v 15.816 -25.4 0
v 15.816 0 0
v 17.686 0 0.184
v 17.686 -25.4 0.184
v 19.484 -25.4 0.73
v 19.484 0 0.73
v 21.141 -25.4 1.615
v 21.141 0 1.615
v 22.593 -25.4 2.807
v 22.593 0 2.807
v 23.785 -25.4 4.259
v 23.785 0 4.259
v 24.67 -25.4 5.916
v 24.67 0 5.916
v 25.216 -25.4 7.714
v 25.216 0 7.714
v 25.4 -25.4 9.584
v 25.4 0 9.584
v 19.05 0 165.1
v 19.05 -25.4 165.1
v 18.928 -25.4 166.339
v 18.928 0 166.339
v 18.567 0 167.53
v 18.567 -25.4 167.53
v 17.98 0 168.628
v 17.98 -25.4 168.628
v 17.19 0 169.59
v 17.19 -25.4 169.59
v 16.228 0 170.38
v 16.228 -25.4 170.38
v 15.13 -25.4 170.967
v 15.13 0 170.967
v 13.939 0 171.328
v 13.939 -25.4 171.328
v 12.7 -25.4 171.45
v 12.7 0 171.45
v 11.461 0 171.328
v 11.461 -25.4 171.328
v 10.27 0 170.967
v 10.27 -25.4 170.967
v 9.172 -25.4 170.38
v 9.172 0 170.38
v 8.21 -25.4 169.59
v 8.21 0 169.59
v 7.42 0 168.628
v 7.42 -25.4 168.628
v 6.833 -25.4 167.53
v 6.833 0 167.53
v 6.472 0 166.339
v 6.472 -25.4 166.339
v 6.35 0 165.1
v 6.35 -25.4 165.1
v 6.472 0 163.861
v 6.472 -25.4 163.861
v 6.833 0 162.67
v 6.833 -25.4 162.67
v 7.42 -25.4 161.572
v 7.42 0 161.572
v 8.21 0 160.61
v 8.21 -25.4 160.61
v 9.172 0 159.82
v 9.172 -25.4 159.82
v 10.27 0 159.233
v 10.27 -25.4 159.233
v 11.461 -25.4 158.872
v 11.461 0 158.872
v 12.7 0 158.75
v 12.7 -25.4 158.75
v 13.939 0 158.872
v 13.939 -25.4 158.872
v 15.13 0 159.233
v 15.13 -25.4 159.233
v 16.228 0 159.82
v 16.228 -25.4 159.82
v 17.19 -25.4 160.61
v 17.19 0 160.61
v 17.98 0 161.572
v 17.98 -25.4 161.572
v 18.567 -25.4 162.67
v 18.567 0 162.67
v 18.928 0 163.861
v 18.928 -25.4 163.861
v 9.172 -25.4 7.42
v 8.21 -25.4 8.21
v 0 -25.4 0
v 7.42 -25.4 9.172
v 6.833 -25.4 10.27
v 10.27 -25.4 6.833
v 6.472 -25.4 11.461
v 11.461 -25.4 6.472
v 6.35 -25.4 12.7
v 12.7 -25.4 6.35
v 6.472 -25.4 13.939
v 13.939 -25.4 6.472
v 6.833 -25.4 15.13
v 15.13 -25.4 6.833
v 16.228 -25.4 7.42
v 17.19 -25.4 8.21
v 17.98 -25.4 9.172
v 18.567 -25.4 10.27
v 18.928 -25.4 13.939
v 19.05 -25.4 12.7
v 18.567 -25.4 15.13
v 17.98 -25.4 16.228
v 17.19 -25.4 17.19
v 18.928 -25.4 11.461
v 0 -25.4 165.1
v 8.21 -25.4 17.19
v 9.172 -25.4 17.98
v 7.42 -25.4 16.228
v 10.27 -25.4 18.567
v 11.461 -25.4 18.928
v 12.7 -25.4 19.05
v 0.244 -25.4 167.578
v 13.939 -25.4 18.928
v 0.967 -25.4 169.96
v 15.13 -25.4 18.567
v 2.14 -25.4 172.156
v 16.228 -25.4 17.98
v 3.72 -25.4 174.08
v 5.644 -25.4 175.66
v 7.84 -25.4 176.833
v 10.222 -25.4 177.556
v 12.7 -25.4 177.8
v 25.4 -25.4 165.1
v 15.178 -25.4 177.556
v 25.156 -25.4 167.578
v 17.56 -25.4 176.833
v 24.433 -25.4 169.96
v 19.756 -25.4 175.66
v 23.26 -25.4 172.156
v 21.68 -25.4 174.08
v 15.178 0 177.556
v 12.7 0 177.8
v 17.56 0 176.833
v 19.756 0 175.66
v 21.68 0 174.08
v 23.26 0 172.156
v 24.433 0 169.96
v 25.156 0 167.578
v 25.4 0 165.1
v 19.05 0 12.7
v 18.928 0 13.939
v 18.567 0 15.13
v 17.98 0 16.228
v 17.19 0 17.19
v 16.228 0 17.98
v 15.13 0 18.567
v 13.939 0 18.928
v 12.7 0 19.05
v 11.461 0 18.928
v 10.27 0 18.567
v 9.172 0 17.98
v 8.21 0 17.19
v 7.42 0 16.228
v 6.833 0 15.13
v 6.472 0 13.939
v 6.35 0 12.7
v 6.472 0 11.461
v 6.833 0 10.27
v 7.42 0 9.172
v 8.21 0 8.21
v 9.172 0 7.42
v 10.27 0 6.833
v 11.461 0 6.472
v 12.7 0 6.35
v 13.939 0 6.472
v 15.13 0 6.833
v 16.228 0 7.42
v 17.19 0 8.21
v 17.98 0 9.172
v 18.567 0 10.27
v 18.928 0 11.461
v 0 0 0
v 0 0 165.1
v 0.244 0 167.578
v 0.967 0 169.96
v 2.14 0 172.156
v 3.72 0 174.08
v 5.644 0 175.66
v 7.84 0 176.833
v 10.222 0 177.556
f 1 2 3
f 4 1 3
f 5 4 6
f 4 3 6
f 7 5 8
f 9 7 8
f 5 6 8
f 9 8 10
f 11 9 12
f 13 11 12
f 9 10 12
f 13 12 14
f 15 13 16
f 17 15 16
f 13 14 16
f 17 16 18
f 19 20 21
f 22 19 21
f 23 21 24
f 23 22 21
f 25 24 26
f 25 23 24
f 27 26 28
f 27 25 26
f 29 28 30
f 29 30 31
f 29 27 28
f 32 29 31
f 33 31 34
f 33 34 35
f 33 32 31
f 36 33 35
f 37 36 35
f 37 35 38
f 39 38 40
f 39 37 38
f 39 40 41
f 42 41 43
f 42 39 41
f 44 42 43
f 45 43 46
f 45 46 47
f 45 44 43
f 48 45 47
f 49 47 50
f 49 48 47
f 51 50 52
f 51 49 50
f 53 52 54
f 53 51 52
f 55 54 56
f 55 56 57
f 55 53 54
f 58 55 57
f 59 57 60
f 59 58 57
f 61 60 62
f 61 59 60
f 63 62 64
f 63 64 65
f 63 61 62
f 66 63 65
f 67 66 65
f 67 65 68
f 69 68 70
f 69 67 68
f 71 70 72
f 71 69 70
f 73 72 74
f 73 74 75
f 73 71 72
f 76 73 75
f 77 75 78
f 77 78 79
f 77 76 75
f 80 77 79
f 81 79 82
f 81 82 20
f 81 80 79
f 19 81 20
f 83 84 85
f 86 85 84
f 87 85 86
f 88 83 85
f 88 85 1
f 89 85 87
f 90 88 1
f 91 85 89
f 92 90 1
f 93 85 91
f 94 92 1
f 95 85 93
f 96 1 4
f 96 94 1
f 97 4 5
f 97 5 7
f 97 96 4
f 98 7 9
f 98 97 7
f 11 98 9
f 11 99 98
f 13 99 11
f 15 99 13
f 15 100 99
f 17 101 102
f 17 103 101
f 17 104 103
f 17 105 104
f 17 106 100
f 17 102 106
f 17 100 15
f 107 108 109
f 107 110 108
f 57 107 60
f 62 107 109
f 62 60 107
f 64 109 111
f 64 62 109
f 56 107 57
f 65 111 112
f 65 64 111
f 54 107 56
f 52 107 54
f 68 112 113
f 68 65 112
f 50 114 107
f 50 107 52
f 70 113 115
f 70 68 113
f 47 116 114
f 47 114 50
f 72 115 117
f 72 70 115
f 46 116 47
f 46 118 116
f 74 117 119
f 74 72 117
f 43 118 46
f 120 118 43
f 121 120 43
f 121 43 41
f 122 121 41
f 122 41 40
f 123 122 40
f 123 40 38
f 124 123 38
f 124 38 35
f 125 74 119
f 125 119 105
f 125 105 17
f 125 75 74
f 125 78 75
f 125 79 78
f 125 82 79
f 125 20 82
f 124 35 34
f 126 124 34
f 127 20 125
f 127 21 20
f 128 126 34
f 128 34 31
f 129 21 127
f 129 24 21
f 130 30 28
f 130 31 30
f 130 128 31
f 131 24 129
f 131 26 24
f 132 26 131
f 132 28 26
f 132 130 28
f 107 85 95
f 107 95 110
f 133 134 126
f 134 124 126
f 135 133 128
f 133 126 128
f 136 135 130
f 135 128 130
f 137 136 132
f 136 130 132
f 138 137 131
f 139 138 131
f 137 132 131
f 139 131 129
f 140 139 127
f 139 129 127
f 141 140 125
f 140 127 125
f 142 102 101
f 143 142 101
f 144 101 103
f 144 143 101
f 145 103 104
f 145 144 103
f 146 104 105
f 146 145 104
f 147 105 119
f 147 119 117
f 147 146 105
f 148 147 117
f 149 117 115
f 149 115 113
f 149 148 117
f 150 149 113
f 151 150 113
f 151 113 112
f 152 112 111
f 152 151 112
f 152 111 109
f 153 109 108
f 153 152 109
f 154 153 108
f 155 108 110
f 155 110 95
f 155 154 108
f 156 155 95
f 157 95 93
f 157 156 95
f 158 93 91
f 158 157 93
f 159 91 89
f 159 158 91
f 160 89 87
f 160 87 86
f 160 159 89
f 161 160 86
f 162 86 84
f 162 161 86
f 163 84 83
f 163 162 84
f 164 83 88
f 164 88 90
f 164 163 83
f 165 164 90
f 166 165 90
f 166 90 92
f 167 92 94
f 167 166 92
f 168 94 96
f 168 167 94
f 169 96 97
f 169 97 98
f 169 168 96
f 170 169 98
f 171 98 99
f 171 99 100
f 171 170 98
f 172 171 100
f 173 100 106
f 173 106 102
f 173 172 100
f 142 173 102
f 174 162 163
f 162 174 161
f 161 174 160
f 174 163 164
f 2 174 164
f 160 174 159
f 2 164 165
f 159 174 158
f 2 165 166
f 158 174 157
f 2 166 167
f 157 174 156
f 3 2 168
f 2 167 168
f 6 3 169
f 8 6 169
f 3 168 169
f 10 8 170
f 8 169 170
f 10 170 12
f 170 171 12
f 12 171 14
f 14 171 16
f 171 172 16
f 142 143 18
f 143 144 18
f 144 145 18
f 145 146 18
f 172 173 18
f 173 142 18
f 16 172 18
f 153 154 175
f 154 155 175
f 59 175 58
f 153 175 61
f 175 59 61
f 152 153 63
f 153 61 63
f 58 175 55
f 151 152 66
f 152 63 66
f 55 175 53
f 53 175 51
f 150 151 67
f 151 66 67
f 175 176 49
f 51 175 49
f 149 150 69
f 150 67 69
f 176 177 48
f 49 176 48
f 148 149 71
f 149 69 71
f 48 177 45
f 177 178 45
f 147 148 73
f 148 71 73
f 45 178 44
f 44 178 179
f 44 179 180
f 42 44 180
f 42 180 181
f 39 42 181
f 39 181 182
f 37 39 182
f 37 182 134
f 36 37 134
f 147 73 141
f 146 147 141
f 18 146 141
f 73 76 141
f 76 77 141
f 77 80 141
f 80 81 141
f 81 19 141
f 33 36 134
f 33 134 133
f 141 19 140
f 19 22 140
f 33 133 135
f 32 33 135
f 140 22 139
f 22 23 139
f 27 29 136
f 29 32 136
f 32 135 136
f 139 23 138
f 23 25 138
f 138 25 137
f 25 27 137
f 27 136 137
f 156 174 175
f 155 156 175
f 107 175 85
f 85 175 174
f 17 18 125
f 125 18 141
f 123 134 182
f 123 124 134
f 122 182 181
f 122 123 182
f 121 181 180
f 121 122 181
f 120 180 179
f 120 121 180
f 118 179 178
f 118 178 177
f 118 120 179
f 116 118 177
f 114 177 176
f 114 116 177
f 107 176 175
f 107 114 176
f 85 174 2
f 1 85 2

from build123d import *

# Parameters (mm, degrees)
F0_R     = 6.35
F1_DEPTH = 25.4
F2_R     = 12.7
F3_R     = 12.69999


# Not quite as in the source:
# - a fillet or chamfer is up to 0.001 mm smaller than in the source, because OpenCascade refuses the exact size


with BuildPart() as f1:
    # F0 (on Front) → F1 (new body)
    with BuildSketch(Plane.XZ):
        with BuildLine():
            Line((0, 177.8), (0, 0))
            Line((0, 0), (15.8163251287, 0))
            ThreePointArc((15.8163251287, 0), (22.5930066189, 2.8069933811), (25.4, 9.5836748713))
            Line((25.4, 9.5836748713), (25.4, 177.8))
            Line((25.4, 177.8), (0, 177.8))
        make_face()
        with Locations((12.7, 12.7)):
            Circle(F0_R, mode=Mode.SUBTRACT)
        with Locations((12.7, 165.1)):
            Circle(F0_R, mode=Mode.SUBTRACT)
    extrude(amount=F1_DEPTH)

    # F2
    f2_edges = [f1.edges().sort_by_distance(p)[0] for p in [
        (25.4, -12.7, 177.8),
    ]]
    fillet(f2_edges, radius=F2_R)

    # F3 (radius 12.7 in the source; OpenCascade refuses exactly that, so slightly less here)
    f3_edges = [f1.edges().sort_by_distance(p)[0] for p in [
        (0, -12.7, 177.8),
    ]]
    fillet(f3_edges, radius=F3_R)


solid = f1.part
